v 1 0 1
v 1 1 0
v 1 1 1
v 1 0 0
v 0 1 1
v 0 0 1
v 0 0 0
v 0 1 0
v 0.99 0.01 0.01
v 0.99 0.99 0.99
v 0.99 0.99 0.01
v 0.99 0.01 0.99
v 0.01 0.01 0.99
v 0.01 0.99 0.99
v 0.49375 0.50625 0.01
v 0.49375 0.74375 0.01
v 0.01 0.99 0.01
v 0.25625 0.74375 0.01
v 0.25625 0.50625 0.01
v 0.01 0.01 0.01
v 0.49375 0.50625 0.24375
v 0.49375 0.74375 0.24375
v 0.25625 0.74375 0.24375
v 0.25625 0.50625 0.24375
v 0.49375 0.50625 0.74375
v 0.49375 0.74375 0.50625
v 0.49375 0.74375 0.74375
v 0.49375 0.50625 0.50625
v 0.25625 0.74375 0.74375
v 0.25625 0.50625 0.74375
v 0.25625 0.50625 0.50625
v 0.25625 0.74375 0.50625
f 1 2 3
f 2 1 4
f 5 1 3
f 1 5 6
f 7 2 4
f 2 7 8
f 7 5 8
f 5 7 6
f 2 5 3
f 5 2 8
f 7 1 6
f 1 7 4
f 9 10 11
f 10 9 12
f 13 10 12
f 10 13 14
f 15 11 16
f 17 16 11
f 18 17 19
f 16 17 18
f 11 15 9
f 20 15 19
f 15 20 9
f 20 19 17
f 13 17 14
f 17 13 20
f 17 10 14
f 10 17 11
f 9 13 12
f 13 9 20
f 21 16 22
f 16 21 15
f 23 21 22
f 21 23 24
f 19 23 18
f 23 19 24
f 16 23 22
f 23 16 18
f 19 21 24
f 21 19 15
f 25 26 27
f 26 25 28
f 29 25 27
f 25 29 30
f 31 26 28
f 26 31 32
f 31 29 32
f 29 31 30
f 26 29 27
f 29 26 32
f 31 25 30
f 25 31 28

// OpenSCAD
translate([0.375, 0.625, 0.125]) color([0.3388593335787915, 0.8372642277909276, 0.3624415377760226]) cube([0.2375, 0.2375, 0.2375], center=true);
translate([0.375, 0.625, 0.625]) color([0.9506098367229612, 0.35574375139565306, 0.7804160128228347]) cube([0.2375, 0.2375, 0.2375], center=true);
color([0.3,0.3,0.3,0.3]) difference() { cube([1,1,1]); translate([0.01,0.01,0.01]) cube([0.98,0.98,0.98]); }
